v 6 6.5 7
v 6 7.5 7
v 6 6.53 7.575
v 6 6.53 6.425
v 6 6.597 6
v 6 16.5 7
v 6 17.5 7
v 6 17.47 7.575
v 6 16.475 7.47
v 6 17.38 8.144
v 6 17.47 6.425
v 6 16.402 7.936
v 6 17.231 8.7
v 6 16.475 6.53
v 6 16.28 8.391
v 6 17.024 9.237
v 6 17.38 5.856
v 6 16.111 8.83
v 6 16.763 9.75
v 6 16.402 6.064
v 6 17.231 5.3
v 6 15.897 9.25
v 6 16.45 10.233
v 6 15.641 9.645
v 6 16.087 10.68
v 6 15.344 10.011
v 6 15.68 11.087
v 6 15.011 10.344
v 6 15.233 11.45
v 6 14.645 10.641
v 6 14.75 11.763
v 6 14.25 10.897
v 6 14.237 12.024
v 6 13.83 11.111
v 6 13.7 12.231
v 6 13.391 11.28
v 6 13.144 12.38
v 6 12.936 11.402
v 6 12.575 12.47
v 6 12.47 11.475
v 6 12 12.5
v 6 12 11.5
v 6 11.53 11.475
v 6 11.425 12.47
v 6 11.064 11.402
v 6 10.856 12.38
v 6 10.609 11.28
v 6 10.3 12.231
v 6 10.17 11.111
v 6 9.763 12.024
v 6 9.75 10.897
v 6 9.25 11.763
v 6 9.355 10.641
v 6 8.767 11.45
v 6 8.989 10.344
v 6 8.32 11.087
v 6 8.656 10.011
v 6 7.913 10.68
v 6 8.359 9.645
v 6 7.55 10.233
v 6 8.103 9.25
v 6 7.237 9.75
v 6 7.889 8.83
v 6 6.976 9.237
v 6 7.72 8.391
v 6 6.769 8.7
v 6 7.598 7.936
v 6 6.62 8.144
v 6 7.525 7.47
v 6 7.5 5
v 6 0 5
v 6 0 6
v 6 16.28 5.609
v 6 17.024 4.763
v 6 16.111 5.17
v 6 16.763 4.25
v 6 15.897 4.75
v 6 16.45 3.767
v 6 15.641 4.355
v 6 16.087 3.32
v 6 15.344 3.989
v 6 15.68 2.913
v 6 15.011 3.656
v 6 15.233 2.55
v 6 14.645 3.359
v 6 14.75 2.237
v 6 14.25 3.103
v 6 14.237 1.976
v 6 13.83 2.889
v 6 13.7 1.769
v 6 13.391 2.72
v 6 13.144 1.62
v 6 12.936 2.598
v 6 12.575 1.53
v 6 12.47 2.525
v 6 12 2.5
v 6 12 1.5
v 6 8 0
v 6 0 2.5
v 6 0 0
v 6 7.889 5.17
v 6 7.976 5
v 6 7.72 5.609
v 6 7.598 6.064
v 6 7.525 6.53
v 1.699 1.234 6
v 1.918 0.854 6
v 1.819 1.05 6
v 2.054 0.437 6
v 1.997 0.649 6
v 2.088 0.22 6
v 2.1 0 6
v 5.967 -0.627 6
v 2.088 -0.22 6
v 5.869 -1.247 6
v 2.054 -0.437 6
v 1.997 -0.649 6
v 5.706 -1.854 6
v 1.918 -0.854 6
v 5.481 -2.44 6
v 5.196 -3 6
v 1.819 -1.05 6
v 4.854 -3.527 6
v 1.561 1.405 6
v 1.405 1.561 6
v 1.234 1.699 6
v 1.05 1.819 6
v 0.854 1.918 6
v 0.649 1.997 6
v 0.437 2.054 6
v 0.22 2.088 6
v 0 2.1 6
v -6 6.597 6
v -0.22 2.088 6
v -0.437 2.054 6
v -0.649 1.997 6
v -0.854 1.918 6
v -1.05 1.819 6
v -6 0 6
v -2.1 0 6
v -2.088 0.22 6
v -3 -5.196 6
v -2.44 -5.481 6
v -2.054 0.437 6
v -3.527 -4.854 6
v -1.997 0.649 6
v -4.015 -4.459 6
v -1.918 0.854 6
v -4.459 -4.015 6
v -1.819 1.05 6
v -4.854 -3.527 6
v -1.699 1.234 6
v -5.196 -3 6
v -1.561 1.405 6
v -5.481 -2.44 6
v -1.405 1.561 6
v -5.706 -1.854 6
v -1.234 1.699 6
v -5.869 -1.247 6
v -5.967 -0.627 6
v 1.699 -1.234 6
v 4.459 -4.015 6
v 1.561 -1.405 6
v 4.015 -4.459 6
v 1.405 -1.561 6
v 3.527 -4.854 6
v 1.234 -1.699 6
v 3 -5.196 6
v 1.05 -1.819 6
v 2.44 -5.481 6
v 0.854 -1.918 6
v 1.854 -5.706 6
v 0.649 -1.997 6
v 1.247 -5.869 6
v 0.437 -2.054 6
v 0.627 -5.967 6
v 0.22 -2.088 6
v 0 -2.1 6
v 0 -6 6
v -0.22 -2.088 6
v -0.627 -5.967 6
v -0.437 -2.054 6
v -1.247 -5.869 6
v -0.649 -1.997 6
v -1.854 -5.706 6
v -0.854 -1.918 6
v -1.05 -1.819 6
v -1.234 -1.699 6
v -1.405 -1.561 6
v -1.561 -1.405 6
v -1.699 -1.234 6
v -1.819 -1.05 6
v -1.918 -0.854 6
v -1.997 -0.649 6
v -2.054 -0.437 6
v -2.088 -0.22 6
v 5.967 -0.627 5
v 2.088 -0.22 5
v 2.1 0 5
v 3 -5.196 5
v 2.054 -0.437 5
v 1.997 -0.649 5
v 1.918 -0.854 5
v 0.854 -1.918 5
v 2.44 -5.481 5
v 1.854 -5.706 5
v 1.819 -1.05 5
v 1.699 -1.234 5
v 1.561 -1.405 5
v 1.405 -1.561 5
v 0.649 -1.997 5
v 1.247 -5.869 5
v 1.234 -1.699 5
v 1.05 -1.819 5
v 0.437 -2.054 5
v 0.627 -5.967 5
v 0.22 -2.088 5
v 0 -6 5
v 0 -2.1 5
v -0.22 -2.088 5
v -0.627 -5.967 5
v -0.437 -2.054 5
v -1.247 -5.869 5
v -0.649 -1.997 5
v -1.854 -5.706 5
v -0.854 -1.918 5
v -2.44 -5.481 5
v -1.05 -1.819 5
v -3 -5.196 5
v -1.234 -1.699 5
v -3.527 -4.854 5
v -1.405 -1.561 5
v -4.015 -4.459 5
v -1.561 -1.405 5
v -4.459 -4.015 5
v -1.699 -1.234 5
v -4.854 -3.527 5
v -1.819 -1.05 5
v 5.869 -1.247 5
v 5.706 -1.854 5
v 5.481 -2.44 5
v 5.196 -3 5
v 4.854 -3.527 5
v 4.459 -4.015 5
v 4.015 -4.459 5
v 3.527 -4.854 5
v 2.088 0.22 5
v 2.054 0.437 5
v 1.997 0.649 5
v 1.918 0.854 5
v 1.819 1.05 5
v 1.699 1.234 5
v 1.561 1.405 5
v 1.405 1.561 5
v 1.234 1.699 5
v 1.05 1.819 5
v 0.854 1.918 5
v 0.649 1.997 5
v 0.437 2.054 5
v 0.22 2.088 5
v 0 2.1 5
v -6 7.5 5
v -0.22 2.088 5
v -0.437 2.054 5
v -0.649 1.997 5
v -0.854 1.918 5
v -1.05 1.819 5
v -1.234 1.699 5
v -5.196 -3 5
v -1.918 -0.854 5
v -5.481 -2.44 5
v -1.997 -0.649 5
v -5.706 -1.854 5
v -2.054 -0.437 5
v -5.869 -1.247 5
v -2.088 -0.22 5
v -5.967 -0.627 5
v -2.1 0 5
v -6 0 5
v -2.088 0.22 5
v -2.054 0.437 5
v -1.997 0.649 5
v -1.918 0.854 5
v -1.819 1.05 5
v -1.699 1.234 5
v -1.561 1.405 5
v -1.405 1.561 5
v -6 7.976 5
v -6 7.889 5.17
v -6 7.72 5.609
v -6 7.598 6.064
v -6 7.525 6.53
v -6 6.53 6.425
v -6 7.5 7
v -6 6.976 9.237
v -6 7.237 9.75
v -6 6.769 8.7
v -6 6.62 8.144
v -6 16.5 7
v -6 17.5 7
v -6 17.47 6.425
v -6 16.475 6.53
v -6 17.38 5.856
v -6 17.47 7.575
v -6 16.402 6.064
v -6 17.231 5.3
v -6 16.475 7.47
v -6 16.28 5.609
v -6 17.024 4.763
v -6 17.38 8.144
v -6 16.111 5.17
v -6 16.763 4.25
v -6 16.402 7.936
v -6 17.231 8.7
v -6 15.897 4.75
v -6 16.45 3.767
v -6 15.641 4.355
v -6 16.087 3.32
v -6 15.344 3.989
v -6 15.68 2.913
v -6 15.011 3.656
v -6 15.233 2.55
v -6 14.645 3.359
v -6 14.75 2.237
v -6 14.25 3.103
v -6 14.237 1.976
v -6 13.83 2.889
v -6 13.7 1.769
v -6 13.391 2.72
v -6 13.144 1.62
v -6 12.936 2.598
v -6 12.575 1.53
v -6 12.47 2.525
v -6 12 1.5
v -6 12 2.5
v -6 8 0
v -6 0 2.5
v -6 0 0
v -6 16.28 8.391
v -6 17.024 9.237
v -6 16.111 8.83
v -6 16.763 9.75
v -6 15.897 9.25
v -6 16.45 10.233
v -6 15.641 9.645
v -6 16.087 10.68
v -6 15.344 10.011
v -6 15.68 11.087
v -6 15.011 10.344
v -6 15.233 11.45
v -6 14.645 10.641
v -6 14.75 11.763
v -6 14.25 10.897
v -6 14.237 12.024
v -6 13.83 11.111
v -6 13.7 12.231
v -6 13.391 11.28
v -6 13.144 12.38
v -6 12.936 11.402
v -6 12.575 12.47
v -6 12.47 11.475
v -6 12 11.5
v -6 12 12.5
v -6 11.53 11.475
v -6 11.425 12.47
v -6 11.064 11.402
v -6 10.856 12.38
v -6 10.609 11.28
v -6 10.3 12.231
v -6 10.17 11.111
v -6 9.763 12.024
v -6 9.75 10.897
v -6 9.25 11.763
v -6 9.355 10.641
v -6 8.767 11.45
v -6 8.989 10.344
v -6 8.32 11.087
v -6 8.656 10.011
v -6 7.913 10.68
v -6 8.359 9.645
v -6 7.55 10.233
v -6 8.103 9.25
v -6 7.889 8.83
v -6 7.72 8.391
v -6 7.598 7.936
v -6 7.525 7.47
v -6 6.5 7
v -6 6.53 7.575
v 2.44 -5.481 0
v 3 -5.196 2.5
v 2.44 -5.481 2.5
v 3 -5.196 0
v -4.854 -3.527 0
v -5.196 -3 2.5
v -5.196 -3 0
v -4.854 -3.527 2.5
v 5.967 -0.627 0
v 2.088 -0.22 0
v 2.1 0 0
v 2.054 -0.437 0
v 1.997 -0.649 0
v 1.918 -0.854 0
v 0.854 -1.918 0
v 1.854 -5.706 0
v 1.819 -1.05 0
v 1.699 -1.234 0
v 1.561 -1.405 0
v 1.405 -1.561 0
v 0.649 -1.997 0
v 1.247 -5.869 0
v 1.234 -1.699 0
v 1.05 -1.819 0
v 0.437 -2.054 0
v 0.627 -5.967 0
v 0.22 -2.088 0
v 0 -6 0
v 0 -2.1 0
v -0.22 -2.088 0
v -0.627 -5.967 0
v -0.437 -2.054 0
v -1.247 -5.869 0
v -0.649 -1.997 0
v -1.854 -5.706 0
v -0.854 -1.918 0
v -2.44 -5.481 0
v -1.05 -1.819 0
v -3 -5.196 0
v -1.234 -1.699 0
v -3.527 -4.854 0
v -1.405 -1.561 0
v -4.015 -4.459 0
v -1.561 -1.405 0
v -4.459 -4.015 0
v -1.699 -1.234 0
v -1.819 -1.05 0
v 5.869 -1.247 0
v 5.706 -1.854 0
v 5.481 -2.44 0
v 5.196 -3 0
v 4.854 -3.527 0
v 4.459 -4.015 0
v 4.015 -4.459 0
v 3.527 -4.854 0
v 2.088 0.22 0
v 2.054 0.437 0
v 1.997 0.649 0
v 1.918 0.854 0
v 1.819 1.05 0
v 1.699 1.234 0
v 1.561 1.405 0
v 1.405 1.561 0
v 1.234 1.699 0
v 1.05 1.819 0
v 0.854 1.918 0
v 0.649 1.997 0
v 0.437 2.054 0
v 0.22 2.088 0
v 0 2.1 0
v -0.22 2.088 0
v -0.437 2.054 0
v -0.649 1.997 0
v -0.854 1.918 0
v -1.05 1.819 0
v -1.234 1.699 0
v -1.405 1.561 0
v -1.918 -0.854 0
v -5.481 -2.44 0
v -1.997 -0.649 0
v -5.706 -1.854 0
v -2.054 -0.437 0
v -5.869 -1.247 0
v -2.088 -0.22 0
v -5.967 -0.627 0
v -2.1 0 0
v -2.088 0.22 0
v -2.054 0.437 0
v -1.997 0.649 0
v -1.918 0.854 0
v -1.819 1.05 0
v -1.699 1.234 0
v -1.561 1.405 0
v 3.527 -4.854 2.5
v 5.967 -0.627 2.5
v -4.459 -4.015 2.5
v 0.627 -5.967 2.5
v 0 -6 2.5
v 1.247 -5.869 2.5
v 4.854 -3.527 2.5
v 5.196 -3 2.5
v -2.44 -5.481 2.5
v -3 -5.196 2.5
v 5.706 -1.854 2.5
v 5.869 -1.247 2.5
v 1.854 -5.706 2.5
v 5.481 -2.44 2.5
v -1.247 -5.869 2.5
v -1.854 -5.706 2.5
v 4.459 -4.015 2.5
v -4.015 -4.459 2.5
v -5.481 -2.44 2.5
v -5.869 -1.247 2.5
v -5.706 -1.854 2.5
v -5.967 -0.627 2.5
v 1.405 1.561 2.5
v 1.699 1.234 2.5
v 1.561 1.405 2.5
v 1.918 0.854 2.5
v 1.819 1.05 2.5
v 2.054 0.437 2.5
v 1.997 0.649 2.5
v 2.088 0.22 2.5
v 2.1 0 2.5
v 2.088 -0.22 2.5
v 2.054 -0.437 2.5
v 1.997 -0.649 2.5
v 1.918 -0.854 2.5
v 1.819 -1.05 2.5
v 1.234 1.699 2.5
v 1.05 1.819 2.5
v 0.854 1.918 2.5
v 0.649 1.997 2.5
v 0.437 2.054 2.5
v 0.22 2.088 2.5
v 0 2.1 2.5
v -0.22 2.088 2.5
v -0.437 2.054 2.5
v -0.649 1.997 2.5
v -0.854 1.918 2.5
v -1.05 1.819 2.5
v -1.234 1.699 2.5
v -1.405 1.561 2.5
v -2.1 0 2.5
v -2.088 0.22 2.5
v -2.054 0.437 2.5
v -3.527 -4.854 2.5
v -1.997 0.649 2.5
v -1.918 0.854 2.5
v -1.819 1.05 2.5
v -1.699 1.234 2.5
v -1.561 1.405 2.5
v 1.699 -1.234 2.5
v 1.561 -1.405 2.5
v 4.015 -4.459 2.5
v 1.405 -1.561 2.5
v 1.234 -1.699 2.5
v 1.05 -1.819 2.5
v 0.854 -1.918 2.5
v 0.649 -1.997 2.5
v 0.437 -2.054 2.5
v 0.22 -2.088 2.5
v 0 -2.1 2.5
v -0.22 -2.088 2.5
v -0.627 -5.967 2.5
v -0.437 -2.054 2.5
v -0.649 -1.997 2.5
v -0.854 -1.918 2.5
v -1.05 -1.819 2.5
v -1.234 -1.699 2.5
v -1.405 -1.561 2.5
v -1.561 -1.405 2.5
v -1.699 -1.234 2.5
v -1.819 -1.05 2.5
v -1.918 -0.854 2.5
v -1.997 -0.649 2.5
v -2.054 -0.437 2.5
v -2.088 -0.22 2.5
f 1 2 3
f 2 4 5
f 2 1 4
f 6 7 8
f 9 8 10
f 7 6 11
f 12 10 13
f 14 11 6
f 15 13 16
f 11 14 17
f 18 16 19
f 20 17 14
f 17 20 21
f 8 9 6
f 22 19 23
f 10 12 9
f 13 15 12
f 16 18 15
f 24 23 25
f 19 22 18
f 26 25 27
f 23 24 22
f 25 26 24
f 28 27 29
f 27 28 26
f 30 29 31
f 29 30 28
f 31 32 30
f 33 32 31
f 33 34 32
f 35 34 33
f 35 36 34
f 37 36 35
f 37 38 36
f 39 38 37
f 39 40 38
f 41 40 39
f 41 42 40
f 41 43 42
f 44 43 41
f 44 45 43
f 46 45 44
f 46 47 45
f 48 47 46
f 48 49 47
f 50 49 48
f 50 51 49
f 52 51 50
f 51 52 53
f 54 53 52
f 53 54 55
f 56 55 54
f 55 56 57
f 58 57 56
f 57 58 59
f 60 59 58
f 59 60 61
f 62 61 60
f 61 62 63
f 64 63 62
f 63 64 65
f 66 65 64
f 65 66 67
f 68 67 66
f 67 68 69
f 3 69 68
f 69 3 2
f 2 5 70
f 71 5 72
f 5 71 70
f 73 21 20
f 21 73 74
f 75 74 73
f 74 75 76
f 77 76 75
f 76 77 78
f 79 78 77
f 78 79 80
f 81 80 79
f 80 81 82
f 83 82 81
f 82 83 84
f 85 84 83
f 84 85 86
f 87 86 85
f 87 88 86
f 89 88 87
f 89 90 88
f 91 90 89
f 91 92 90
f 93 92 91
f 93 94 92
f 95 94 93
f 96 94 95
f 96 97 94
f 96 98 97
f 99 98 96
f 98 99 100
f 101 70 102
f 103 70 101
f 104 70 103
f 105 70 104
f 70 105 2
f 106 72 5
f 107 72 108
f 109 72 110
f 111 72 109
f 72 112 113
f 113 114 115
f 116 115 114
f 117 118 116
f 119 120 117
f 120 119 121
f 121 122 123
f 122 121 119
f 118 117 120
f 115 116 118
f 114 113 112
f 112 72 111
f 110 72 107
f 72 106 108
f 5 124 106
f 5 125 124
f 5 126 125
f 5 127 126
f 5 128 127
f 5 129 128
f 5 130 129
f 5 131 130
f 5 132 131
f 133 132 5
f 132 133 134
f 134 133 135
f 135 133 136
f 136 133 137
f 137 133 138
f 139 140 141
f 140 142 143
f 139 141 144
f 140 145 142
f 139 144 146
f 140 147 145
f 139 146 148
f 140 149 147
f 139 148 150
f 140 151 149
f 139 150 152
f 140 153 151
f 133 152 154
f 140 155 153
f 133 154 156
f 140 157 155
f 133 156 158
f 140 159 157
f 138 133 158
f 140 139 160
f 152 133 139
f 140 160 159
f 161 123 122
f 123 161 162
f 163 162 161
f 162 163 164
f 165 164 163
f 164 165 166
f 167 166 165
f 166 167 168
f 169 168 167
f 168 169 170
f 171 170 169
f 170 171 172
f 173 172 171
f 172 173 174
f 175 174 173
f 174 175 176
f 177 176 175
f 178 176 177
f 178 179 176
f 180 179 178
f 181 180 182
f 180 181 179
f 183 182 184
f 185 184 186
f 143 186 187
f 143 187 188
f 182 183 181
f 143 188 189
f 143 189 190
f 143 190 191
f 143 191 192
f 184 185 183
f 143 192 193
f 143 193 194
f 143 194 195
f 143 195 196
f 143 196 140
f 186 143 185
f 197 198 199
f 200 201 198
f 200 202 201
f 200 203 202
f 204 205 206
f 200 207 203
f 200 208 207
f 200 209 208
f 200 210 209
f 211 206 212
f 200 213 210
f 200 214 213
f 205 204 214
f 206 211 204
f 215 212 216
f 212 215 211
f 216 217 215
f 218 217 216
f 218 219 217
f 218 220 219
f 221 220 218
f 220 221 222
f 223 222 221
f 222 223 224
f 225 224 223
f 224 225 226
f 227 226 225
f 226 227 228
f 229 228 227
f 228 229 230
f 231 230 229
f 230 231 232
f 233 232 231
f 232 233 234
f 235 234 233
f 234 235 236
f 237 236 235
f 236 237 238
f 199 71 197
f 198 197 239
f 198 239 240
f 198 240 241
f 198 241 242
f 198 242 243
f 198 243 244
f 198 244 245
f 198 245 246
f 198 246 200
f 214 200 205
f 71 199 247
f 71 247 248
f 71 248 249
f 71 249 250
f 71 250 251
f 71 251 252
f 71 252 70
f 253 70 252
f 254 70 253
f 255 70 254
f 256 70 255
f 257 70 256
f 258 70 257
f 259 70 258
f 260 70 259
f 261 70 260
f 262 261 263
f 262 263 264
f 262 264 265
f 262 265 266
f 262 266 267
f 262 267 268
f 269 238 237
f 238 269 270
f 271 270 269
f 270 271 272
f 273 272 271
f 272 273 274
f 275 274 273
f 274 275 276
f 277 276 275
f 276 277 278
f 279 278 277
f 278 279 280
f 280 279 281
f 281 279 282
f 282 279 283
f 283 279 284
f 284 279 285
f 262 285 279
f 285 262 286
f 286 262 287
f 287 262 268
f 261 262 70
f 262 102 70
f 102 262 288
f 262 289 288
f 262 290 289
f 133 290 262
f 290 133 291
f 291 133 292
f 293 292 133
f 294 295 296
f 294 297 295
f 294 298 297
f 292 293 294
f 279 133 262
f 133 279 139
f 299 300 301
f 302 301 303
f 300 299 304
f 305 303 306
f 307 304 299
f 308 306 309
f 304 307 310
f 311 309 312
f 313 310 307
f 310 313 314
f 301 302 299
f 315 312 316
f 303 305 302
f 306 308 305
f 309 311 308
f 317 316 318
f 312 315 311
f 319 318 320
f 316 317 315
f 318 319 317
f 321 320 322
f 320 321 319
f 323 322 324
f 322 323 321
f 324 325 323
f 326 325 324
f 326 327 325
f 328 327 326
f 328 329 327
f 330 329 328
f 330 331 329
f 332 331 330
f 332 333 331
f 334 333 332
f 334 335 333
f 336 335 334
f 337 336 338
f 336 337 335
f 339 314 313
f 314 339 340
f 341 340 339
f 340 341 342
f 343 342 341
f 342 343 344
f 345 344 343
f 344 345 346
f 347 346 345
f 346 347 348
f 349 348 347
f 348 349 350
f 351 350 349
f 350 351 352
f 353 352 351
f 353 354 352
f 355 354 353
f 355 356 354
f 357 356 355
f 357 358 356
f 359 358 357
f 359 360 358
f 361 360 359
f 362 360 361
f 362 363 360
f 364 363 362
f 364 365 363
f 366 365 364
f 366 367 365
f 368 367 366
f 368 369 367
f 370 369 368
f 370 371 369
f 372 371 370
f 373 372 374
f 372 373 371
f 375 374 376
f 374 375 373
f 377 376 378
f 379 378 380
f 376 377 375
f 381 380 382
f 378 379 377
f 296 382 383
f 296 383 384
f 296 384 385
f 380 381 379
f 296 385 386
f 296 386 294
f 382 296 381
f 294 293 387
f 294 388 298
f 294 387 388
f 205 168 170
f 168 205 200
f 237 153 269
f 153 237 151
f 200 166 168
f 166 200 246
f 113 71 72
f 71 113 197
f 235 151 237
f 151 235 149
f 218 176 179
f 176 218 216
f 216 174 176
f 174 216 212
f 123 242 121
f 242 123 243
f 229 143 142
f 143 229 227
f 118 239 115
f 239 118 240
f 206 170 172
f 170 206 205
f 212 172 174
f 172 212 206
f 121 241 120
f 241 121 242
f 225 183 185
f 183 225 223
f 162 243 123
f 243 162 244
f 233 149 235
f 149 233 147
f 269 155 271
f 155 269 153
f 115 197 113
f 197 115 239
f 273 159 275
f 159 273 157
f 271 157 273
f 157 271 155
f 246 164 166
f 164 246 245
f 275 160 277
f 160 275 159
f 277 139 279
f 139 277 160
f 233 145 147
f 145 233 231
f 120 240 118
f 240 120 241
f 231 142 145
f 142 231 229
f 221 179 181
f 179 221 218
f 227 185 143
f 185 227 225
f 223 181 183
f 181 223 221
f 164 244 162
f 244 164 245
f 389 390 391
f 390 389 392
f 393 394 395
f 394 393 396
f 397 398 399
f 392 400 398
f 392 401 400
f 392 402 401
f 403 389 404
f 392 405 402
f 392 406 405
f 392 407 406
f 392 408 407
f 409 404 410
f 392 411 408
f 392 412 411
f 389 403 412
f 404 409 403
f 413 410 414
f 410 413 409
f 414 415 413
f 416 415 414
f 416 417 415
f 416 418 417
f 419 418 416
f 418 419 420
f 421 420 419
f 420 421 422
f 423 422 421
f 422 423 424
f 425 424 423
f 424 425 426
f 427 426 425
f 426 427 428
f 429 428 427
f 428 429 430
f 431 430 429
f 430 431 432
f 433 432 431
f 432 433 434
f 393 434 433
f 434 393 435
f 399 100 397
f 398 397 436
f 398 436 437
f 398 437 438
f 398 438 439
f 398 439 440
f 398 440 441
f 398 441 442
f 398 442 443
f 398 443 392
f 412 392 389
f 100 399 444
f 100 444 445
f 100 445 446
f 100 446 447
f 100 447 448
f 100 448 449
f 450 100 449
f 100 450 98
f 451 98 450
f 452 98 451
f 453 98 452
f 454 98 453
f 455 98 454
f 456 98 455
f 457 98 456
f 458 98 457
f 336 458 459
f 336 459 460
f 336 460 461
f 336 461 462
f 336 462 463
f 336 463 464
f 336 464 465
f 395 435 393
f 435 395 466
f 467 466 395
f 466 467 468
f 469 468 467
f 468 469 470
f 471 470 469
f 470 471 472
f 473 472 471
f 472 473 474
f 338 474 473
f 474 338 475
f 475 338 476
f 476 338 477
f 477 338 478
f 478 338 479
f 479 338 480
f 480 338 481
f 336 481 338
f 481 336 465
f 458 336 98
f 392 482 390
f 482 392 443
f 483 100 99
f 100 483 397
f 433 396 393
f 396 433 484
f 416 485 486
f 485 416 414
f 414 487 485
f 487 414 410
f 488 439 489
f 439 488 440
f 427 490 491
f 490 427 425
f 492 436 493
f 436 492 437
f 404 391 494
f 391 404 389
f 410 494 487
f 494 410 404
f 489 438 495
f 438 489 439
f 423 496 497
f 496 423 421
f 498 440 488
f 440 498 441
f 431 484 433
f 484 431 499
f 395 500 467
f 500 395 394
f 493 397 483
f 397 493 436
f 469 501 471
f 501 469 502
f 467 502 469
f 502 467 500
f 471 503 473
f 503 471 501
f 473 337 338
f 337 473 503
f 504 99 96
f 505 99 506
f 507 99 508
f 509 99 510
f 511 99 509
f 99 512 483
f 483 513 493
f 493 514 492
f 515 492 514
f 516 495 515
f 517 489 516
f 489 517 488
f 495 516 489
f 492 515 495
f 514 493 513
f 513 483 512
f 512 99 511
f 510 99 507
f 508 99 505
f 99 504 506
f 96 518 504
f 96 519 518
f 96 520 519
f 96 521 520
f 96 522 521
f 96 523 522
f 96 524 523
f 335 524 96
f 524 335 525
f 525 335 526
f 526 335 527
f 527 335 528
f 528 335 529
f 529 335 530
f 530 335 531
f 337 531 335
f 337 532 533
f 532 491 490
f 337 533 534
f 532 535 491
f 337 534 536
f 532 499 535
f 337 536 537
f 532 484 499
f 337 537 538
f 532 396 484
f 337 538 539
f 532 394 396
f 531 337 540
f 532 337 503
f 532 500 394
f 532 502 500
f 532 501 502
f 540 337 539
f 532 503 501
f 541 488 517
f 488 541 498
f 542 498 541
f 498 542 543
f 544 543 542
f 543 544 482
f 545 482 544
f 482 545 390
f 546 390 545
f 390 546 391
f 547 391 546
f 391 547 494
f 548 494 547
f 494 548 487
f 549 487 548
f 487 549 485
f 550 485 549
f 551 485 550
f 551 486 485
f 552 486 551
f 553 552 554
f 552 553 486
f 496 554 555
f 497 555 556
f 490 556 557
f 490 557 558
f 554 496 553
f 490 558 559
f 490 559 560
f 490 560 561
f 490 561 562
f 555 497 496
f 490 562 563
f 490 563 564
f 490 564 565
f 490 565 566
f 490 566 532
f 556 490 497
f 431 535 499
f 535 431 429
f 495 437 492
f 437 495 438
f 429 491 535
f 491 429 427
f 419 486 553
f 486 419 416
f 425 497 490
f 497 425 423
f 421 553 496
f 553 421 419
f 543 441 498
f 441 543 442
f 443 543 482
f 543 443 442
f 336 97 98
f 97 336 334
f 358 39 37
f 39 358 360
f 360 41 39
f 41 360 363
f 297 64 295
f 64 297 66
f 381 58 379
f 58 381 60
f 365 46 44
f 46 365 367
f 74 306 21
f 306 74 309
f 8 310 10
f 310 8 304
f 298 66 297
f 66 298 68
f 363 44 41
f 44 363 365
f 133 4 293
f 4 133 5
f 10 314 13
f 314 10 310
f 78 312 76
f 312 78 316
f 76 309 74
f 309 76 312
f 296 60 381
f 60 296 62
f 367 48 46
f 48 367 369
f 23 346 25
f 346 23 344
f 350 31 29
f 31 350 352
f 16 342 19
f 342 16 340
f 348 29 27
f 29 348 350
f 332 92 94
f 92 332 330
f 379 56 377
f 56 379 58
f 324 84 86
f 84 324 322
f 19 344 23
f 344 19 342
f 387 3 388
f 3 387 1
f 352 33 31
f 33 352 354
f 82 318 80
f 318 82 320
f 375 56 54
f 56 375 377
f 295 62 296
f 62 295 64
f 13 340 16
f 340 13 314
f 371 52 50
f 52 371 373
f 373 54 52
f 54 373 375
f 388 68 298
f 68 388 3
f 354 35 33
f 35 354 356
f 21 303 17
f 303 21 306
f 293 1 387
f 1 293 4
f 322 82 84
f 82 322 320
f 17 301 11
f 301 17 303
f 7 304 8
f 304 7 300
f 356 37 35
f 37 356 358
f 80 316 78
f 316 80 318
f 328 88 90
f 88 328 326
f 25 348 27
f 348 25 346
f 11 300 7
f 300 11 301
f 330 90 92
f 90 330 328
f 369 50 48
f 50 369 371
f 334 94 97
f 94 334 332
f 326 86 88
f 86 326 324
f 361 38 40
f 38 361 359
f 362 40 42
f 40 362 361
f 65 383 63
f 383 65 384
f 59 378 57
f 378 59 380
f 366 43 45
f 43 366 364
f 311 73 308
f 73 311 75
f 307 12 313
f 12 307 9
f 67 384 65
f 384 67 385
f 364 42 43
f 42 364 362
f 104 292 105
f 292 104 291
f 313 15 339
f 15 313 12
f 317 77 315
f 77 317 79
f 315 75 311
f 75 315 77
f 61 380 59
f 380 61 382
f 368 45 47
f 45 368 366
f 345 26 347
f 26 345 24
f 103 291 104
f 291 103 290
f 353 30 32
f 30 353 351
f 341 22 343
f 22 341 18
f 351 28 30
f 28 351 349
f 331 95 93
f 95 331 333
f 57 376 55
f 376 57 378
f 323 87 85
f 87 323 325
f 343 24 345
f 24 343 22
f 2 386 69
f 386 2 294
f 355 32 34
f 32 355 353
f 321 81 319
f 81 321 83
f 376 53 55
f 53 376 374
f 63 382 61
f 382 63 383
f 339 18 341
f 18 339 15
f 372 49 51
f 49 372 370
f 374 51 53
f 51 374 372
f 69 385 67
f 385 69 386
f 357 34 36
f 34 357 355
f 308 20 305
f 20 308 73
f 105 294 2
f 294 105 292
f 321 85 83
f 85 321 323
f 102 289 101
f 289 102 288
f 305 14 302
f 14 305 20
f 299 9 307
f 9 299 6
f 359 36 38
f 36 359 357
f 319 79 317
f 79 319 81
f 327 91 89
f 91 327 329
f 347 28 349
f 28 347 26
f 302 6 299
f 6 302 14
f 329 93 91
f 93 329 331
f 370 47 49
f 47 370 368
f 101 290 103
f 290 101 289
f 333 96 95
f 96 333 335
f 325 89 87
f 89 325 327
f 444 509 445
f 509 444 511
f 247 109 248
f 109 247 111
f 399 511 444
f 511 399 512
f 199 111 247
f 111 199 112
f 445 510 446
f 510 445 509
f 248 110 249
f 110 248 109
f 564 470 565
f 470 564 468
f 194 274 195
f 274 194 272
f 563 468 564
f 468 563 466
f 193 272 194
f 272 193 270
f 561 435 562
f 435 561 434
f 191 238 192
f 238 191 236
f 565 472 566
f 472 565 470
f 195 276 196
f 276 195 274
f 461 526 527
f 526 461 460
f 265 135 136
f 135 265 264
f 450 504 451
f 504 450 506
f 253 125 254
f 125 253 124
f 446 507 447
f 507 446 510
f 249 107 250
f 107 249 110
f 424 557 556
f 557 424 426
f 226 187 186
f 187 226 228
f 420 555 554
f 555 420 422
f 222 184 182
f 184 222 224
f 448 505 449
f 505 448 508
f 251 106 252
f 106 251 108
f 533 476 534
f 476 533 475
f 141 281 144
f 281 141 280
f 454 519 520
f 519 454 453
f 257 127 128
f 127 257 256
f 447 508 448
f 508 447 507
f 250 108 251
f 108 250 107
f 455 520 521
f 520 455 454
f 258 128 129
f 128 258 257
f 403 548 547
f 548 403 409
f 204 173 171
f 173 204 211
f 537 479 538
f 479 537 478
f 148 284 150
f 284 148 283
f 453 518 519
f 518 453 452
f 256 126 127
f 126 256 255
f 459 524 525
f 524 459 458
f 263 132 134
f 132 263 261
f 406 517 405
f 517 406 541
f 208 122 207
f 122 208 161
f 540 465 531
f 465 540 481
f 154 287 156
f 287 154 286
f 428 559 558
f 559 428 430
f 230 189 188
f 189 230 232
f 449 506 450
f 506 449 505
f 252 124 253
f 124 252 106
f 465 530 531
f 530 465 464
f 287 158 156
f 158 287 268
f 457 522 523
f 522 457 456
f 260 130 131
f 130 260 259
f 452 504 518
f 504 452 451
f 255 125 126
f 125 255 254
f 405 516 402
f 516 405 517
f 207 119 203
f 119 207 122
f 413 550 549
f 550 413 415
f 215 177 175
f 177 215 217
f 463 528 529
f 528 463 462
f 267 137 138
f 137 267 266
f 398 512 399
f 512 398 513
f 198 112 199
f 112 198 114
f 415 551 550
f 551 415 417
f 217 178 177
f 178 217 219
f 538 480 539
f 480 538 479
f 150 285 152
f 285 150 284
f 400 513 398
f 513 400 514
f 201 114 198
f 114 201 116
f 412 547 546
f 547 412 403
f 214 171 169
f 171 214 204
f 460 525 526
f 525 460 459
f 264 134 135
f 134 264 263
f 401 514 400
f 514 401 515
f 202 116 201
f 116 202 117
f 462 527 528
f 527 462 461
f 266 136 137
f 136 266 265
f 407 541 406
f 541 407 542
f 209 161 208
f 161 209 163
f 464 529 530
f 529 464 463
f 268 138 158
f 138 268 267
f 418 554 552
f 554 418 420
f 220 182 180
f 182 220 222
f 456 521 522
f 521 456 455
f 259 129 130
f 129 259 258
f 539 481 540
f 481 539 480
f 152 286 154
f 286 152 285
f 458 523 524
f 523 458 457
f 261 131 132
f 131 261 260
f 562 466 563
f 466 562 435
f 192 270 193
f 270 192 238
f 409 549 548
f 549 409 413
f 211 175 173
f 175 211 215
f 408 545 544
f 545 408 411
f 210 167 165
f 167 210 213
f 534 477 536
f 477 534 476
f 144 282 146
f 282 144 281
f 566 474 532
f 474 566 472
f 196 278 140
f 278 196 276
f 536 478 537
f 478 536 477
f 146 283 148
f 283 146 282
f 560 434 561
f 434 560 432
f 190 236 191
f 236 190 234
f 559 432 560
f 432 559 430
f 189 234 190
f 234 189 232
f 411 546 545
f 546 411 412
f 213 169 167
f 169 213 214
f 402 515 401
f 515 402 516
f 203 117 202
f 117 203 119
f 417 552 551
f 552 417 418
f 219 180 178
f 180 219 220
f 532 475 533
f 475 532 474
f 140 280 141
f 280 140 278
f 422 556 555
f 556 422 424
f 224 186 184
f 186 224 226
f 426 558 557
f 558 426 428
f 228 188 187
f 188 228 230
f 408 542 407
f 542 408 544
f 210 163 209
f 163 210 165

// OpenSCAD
bolt_hole = 4.2;

cable_hole = 9;
rise = 2.5;
thickness = 1;
gap = 2.5;

$fn = 60;

module tabs() {
	//base
	cylinder(h = rise , r = 6 );
	translate([-6,0,0])
		hull() {
			cube([12,8,rise]);
			translate([0,12-1,rise - thickness])cube([12,1,thickness]);
		}


	//top
	translate ([0,0,rise + gap])
	{
		translate([-6,0,0])cube([12,12 - cable_hole/2,thickness]);
		cylinder(h = thickness , r = 6 );
	}

}

module loop() {
	translate([6,0,0])
	rotate([0,-90, 0])
	difference() {
		cylinder(h = 12, r = cable_hole/2 + thickness);
		cylinder(h = 12, r = cable_hole/2);
		translate([-cable_hole/2 ,-cable_hole , 0])
		cube([gap,cable_hole,12]);
	}
	

}

module main() {
	tabs();
	translate([0, 12,cable_hole/2 + rise])

	//loop();
	loop();

}

difference() {
	main();
	cylinder(h = 20, r = bolt_hole/2);
}

//tabs();
